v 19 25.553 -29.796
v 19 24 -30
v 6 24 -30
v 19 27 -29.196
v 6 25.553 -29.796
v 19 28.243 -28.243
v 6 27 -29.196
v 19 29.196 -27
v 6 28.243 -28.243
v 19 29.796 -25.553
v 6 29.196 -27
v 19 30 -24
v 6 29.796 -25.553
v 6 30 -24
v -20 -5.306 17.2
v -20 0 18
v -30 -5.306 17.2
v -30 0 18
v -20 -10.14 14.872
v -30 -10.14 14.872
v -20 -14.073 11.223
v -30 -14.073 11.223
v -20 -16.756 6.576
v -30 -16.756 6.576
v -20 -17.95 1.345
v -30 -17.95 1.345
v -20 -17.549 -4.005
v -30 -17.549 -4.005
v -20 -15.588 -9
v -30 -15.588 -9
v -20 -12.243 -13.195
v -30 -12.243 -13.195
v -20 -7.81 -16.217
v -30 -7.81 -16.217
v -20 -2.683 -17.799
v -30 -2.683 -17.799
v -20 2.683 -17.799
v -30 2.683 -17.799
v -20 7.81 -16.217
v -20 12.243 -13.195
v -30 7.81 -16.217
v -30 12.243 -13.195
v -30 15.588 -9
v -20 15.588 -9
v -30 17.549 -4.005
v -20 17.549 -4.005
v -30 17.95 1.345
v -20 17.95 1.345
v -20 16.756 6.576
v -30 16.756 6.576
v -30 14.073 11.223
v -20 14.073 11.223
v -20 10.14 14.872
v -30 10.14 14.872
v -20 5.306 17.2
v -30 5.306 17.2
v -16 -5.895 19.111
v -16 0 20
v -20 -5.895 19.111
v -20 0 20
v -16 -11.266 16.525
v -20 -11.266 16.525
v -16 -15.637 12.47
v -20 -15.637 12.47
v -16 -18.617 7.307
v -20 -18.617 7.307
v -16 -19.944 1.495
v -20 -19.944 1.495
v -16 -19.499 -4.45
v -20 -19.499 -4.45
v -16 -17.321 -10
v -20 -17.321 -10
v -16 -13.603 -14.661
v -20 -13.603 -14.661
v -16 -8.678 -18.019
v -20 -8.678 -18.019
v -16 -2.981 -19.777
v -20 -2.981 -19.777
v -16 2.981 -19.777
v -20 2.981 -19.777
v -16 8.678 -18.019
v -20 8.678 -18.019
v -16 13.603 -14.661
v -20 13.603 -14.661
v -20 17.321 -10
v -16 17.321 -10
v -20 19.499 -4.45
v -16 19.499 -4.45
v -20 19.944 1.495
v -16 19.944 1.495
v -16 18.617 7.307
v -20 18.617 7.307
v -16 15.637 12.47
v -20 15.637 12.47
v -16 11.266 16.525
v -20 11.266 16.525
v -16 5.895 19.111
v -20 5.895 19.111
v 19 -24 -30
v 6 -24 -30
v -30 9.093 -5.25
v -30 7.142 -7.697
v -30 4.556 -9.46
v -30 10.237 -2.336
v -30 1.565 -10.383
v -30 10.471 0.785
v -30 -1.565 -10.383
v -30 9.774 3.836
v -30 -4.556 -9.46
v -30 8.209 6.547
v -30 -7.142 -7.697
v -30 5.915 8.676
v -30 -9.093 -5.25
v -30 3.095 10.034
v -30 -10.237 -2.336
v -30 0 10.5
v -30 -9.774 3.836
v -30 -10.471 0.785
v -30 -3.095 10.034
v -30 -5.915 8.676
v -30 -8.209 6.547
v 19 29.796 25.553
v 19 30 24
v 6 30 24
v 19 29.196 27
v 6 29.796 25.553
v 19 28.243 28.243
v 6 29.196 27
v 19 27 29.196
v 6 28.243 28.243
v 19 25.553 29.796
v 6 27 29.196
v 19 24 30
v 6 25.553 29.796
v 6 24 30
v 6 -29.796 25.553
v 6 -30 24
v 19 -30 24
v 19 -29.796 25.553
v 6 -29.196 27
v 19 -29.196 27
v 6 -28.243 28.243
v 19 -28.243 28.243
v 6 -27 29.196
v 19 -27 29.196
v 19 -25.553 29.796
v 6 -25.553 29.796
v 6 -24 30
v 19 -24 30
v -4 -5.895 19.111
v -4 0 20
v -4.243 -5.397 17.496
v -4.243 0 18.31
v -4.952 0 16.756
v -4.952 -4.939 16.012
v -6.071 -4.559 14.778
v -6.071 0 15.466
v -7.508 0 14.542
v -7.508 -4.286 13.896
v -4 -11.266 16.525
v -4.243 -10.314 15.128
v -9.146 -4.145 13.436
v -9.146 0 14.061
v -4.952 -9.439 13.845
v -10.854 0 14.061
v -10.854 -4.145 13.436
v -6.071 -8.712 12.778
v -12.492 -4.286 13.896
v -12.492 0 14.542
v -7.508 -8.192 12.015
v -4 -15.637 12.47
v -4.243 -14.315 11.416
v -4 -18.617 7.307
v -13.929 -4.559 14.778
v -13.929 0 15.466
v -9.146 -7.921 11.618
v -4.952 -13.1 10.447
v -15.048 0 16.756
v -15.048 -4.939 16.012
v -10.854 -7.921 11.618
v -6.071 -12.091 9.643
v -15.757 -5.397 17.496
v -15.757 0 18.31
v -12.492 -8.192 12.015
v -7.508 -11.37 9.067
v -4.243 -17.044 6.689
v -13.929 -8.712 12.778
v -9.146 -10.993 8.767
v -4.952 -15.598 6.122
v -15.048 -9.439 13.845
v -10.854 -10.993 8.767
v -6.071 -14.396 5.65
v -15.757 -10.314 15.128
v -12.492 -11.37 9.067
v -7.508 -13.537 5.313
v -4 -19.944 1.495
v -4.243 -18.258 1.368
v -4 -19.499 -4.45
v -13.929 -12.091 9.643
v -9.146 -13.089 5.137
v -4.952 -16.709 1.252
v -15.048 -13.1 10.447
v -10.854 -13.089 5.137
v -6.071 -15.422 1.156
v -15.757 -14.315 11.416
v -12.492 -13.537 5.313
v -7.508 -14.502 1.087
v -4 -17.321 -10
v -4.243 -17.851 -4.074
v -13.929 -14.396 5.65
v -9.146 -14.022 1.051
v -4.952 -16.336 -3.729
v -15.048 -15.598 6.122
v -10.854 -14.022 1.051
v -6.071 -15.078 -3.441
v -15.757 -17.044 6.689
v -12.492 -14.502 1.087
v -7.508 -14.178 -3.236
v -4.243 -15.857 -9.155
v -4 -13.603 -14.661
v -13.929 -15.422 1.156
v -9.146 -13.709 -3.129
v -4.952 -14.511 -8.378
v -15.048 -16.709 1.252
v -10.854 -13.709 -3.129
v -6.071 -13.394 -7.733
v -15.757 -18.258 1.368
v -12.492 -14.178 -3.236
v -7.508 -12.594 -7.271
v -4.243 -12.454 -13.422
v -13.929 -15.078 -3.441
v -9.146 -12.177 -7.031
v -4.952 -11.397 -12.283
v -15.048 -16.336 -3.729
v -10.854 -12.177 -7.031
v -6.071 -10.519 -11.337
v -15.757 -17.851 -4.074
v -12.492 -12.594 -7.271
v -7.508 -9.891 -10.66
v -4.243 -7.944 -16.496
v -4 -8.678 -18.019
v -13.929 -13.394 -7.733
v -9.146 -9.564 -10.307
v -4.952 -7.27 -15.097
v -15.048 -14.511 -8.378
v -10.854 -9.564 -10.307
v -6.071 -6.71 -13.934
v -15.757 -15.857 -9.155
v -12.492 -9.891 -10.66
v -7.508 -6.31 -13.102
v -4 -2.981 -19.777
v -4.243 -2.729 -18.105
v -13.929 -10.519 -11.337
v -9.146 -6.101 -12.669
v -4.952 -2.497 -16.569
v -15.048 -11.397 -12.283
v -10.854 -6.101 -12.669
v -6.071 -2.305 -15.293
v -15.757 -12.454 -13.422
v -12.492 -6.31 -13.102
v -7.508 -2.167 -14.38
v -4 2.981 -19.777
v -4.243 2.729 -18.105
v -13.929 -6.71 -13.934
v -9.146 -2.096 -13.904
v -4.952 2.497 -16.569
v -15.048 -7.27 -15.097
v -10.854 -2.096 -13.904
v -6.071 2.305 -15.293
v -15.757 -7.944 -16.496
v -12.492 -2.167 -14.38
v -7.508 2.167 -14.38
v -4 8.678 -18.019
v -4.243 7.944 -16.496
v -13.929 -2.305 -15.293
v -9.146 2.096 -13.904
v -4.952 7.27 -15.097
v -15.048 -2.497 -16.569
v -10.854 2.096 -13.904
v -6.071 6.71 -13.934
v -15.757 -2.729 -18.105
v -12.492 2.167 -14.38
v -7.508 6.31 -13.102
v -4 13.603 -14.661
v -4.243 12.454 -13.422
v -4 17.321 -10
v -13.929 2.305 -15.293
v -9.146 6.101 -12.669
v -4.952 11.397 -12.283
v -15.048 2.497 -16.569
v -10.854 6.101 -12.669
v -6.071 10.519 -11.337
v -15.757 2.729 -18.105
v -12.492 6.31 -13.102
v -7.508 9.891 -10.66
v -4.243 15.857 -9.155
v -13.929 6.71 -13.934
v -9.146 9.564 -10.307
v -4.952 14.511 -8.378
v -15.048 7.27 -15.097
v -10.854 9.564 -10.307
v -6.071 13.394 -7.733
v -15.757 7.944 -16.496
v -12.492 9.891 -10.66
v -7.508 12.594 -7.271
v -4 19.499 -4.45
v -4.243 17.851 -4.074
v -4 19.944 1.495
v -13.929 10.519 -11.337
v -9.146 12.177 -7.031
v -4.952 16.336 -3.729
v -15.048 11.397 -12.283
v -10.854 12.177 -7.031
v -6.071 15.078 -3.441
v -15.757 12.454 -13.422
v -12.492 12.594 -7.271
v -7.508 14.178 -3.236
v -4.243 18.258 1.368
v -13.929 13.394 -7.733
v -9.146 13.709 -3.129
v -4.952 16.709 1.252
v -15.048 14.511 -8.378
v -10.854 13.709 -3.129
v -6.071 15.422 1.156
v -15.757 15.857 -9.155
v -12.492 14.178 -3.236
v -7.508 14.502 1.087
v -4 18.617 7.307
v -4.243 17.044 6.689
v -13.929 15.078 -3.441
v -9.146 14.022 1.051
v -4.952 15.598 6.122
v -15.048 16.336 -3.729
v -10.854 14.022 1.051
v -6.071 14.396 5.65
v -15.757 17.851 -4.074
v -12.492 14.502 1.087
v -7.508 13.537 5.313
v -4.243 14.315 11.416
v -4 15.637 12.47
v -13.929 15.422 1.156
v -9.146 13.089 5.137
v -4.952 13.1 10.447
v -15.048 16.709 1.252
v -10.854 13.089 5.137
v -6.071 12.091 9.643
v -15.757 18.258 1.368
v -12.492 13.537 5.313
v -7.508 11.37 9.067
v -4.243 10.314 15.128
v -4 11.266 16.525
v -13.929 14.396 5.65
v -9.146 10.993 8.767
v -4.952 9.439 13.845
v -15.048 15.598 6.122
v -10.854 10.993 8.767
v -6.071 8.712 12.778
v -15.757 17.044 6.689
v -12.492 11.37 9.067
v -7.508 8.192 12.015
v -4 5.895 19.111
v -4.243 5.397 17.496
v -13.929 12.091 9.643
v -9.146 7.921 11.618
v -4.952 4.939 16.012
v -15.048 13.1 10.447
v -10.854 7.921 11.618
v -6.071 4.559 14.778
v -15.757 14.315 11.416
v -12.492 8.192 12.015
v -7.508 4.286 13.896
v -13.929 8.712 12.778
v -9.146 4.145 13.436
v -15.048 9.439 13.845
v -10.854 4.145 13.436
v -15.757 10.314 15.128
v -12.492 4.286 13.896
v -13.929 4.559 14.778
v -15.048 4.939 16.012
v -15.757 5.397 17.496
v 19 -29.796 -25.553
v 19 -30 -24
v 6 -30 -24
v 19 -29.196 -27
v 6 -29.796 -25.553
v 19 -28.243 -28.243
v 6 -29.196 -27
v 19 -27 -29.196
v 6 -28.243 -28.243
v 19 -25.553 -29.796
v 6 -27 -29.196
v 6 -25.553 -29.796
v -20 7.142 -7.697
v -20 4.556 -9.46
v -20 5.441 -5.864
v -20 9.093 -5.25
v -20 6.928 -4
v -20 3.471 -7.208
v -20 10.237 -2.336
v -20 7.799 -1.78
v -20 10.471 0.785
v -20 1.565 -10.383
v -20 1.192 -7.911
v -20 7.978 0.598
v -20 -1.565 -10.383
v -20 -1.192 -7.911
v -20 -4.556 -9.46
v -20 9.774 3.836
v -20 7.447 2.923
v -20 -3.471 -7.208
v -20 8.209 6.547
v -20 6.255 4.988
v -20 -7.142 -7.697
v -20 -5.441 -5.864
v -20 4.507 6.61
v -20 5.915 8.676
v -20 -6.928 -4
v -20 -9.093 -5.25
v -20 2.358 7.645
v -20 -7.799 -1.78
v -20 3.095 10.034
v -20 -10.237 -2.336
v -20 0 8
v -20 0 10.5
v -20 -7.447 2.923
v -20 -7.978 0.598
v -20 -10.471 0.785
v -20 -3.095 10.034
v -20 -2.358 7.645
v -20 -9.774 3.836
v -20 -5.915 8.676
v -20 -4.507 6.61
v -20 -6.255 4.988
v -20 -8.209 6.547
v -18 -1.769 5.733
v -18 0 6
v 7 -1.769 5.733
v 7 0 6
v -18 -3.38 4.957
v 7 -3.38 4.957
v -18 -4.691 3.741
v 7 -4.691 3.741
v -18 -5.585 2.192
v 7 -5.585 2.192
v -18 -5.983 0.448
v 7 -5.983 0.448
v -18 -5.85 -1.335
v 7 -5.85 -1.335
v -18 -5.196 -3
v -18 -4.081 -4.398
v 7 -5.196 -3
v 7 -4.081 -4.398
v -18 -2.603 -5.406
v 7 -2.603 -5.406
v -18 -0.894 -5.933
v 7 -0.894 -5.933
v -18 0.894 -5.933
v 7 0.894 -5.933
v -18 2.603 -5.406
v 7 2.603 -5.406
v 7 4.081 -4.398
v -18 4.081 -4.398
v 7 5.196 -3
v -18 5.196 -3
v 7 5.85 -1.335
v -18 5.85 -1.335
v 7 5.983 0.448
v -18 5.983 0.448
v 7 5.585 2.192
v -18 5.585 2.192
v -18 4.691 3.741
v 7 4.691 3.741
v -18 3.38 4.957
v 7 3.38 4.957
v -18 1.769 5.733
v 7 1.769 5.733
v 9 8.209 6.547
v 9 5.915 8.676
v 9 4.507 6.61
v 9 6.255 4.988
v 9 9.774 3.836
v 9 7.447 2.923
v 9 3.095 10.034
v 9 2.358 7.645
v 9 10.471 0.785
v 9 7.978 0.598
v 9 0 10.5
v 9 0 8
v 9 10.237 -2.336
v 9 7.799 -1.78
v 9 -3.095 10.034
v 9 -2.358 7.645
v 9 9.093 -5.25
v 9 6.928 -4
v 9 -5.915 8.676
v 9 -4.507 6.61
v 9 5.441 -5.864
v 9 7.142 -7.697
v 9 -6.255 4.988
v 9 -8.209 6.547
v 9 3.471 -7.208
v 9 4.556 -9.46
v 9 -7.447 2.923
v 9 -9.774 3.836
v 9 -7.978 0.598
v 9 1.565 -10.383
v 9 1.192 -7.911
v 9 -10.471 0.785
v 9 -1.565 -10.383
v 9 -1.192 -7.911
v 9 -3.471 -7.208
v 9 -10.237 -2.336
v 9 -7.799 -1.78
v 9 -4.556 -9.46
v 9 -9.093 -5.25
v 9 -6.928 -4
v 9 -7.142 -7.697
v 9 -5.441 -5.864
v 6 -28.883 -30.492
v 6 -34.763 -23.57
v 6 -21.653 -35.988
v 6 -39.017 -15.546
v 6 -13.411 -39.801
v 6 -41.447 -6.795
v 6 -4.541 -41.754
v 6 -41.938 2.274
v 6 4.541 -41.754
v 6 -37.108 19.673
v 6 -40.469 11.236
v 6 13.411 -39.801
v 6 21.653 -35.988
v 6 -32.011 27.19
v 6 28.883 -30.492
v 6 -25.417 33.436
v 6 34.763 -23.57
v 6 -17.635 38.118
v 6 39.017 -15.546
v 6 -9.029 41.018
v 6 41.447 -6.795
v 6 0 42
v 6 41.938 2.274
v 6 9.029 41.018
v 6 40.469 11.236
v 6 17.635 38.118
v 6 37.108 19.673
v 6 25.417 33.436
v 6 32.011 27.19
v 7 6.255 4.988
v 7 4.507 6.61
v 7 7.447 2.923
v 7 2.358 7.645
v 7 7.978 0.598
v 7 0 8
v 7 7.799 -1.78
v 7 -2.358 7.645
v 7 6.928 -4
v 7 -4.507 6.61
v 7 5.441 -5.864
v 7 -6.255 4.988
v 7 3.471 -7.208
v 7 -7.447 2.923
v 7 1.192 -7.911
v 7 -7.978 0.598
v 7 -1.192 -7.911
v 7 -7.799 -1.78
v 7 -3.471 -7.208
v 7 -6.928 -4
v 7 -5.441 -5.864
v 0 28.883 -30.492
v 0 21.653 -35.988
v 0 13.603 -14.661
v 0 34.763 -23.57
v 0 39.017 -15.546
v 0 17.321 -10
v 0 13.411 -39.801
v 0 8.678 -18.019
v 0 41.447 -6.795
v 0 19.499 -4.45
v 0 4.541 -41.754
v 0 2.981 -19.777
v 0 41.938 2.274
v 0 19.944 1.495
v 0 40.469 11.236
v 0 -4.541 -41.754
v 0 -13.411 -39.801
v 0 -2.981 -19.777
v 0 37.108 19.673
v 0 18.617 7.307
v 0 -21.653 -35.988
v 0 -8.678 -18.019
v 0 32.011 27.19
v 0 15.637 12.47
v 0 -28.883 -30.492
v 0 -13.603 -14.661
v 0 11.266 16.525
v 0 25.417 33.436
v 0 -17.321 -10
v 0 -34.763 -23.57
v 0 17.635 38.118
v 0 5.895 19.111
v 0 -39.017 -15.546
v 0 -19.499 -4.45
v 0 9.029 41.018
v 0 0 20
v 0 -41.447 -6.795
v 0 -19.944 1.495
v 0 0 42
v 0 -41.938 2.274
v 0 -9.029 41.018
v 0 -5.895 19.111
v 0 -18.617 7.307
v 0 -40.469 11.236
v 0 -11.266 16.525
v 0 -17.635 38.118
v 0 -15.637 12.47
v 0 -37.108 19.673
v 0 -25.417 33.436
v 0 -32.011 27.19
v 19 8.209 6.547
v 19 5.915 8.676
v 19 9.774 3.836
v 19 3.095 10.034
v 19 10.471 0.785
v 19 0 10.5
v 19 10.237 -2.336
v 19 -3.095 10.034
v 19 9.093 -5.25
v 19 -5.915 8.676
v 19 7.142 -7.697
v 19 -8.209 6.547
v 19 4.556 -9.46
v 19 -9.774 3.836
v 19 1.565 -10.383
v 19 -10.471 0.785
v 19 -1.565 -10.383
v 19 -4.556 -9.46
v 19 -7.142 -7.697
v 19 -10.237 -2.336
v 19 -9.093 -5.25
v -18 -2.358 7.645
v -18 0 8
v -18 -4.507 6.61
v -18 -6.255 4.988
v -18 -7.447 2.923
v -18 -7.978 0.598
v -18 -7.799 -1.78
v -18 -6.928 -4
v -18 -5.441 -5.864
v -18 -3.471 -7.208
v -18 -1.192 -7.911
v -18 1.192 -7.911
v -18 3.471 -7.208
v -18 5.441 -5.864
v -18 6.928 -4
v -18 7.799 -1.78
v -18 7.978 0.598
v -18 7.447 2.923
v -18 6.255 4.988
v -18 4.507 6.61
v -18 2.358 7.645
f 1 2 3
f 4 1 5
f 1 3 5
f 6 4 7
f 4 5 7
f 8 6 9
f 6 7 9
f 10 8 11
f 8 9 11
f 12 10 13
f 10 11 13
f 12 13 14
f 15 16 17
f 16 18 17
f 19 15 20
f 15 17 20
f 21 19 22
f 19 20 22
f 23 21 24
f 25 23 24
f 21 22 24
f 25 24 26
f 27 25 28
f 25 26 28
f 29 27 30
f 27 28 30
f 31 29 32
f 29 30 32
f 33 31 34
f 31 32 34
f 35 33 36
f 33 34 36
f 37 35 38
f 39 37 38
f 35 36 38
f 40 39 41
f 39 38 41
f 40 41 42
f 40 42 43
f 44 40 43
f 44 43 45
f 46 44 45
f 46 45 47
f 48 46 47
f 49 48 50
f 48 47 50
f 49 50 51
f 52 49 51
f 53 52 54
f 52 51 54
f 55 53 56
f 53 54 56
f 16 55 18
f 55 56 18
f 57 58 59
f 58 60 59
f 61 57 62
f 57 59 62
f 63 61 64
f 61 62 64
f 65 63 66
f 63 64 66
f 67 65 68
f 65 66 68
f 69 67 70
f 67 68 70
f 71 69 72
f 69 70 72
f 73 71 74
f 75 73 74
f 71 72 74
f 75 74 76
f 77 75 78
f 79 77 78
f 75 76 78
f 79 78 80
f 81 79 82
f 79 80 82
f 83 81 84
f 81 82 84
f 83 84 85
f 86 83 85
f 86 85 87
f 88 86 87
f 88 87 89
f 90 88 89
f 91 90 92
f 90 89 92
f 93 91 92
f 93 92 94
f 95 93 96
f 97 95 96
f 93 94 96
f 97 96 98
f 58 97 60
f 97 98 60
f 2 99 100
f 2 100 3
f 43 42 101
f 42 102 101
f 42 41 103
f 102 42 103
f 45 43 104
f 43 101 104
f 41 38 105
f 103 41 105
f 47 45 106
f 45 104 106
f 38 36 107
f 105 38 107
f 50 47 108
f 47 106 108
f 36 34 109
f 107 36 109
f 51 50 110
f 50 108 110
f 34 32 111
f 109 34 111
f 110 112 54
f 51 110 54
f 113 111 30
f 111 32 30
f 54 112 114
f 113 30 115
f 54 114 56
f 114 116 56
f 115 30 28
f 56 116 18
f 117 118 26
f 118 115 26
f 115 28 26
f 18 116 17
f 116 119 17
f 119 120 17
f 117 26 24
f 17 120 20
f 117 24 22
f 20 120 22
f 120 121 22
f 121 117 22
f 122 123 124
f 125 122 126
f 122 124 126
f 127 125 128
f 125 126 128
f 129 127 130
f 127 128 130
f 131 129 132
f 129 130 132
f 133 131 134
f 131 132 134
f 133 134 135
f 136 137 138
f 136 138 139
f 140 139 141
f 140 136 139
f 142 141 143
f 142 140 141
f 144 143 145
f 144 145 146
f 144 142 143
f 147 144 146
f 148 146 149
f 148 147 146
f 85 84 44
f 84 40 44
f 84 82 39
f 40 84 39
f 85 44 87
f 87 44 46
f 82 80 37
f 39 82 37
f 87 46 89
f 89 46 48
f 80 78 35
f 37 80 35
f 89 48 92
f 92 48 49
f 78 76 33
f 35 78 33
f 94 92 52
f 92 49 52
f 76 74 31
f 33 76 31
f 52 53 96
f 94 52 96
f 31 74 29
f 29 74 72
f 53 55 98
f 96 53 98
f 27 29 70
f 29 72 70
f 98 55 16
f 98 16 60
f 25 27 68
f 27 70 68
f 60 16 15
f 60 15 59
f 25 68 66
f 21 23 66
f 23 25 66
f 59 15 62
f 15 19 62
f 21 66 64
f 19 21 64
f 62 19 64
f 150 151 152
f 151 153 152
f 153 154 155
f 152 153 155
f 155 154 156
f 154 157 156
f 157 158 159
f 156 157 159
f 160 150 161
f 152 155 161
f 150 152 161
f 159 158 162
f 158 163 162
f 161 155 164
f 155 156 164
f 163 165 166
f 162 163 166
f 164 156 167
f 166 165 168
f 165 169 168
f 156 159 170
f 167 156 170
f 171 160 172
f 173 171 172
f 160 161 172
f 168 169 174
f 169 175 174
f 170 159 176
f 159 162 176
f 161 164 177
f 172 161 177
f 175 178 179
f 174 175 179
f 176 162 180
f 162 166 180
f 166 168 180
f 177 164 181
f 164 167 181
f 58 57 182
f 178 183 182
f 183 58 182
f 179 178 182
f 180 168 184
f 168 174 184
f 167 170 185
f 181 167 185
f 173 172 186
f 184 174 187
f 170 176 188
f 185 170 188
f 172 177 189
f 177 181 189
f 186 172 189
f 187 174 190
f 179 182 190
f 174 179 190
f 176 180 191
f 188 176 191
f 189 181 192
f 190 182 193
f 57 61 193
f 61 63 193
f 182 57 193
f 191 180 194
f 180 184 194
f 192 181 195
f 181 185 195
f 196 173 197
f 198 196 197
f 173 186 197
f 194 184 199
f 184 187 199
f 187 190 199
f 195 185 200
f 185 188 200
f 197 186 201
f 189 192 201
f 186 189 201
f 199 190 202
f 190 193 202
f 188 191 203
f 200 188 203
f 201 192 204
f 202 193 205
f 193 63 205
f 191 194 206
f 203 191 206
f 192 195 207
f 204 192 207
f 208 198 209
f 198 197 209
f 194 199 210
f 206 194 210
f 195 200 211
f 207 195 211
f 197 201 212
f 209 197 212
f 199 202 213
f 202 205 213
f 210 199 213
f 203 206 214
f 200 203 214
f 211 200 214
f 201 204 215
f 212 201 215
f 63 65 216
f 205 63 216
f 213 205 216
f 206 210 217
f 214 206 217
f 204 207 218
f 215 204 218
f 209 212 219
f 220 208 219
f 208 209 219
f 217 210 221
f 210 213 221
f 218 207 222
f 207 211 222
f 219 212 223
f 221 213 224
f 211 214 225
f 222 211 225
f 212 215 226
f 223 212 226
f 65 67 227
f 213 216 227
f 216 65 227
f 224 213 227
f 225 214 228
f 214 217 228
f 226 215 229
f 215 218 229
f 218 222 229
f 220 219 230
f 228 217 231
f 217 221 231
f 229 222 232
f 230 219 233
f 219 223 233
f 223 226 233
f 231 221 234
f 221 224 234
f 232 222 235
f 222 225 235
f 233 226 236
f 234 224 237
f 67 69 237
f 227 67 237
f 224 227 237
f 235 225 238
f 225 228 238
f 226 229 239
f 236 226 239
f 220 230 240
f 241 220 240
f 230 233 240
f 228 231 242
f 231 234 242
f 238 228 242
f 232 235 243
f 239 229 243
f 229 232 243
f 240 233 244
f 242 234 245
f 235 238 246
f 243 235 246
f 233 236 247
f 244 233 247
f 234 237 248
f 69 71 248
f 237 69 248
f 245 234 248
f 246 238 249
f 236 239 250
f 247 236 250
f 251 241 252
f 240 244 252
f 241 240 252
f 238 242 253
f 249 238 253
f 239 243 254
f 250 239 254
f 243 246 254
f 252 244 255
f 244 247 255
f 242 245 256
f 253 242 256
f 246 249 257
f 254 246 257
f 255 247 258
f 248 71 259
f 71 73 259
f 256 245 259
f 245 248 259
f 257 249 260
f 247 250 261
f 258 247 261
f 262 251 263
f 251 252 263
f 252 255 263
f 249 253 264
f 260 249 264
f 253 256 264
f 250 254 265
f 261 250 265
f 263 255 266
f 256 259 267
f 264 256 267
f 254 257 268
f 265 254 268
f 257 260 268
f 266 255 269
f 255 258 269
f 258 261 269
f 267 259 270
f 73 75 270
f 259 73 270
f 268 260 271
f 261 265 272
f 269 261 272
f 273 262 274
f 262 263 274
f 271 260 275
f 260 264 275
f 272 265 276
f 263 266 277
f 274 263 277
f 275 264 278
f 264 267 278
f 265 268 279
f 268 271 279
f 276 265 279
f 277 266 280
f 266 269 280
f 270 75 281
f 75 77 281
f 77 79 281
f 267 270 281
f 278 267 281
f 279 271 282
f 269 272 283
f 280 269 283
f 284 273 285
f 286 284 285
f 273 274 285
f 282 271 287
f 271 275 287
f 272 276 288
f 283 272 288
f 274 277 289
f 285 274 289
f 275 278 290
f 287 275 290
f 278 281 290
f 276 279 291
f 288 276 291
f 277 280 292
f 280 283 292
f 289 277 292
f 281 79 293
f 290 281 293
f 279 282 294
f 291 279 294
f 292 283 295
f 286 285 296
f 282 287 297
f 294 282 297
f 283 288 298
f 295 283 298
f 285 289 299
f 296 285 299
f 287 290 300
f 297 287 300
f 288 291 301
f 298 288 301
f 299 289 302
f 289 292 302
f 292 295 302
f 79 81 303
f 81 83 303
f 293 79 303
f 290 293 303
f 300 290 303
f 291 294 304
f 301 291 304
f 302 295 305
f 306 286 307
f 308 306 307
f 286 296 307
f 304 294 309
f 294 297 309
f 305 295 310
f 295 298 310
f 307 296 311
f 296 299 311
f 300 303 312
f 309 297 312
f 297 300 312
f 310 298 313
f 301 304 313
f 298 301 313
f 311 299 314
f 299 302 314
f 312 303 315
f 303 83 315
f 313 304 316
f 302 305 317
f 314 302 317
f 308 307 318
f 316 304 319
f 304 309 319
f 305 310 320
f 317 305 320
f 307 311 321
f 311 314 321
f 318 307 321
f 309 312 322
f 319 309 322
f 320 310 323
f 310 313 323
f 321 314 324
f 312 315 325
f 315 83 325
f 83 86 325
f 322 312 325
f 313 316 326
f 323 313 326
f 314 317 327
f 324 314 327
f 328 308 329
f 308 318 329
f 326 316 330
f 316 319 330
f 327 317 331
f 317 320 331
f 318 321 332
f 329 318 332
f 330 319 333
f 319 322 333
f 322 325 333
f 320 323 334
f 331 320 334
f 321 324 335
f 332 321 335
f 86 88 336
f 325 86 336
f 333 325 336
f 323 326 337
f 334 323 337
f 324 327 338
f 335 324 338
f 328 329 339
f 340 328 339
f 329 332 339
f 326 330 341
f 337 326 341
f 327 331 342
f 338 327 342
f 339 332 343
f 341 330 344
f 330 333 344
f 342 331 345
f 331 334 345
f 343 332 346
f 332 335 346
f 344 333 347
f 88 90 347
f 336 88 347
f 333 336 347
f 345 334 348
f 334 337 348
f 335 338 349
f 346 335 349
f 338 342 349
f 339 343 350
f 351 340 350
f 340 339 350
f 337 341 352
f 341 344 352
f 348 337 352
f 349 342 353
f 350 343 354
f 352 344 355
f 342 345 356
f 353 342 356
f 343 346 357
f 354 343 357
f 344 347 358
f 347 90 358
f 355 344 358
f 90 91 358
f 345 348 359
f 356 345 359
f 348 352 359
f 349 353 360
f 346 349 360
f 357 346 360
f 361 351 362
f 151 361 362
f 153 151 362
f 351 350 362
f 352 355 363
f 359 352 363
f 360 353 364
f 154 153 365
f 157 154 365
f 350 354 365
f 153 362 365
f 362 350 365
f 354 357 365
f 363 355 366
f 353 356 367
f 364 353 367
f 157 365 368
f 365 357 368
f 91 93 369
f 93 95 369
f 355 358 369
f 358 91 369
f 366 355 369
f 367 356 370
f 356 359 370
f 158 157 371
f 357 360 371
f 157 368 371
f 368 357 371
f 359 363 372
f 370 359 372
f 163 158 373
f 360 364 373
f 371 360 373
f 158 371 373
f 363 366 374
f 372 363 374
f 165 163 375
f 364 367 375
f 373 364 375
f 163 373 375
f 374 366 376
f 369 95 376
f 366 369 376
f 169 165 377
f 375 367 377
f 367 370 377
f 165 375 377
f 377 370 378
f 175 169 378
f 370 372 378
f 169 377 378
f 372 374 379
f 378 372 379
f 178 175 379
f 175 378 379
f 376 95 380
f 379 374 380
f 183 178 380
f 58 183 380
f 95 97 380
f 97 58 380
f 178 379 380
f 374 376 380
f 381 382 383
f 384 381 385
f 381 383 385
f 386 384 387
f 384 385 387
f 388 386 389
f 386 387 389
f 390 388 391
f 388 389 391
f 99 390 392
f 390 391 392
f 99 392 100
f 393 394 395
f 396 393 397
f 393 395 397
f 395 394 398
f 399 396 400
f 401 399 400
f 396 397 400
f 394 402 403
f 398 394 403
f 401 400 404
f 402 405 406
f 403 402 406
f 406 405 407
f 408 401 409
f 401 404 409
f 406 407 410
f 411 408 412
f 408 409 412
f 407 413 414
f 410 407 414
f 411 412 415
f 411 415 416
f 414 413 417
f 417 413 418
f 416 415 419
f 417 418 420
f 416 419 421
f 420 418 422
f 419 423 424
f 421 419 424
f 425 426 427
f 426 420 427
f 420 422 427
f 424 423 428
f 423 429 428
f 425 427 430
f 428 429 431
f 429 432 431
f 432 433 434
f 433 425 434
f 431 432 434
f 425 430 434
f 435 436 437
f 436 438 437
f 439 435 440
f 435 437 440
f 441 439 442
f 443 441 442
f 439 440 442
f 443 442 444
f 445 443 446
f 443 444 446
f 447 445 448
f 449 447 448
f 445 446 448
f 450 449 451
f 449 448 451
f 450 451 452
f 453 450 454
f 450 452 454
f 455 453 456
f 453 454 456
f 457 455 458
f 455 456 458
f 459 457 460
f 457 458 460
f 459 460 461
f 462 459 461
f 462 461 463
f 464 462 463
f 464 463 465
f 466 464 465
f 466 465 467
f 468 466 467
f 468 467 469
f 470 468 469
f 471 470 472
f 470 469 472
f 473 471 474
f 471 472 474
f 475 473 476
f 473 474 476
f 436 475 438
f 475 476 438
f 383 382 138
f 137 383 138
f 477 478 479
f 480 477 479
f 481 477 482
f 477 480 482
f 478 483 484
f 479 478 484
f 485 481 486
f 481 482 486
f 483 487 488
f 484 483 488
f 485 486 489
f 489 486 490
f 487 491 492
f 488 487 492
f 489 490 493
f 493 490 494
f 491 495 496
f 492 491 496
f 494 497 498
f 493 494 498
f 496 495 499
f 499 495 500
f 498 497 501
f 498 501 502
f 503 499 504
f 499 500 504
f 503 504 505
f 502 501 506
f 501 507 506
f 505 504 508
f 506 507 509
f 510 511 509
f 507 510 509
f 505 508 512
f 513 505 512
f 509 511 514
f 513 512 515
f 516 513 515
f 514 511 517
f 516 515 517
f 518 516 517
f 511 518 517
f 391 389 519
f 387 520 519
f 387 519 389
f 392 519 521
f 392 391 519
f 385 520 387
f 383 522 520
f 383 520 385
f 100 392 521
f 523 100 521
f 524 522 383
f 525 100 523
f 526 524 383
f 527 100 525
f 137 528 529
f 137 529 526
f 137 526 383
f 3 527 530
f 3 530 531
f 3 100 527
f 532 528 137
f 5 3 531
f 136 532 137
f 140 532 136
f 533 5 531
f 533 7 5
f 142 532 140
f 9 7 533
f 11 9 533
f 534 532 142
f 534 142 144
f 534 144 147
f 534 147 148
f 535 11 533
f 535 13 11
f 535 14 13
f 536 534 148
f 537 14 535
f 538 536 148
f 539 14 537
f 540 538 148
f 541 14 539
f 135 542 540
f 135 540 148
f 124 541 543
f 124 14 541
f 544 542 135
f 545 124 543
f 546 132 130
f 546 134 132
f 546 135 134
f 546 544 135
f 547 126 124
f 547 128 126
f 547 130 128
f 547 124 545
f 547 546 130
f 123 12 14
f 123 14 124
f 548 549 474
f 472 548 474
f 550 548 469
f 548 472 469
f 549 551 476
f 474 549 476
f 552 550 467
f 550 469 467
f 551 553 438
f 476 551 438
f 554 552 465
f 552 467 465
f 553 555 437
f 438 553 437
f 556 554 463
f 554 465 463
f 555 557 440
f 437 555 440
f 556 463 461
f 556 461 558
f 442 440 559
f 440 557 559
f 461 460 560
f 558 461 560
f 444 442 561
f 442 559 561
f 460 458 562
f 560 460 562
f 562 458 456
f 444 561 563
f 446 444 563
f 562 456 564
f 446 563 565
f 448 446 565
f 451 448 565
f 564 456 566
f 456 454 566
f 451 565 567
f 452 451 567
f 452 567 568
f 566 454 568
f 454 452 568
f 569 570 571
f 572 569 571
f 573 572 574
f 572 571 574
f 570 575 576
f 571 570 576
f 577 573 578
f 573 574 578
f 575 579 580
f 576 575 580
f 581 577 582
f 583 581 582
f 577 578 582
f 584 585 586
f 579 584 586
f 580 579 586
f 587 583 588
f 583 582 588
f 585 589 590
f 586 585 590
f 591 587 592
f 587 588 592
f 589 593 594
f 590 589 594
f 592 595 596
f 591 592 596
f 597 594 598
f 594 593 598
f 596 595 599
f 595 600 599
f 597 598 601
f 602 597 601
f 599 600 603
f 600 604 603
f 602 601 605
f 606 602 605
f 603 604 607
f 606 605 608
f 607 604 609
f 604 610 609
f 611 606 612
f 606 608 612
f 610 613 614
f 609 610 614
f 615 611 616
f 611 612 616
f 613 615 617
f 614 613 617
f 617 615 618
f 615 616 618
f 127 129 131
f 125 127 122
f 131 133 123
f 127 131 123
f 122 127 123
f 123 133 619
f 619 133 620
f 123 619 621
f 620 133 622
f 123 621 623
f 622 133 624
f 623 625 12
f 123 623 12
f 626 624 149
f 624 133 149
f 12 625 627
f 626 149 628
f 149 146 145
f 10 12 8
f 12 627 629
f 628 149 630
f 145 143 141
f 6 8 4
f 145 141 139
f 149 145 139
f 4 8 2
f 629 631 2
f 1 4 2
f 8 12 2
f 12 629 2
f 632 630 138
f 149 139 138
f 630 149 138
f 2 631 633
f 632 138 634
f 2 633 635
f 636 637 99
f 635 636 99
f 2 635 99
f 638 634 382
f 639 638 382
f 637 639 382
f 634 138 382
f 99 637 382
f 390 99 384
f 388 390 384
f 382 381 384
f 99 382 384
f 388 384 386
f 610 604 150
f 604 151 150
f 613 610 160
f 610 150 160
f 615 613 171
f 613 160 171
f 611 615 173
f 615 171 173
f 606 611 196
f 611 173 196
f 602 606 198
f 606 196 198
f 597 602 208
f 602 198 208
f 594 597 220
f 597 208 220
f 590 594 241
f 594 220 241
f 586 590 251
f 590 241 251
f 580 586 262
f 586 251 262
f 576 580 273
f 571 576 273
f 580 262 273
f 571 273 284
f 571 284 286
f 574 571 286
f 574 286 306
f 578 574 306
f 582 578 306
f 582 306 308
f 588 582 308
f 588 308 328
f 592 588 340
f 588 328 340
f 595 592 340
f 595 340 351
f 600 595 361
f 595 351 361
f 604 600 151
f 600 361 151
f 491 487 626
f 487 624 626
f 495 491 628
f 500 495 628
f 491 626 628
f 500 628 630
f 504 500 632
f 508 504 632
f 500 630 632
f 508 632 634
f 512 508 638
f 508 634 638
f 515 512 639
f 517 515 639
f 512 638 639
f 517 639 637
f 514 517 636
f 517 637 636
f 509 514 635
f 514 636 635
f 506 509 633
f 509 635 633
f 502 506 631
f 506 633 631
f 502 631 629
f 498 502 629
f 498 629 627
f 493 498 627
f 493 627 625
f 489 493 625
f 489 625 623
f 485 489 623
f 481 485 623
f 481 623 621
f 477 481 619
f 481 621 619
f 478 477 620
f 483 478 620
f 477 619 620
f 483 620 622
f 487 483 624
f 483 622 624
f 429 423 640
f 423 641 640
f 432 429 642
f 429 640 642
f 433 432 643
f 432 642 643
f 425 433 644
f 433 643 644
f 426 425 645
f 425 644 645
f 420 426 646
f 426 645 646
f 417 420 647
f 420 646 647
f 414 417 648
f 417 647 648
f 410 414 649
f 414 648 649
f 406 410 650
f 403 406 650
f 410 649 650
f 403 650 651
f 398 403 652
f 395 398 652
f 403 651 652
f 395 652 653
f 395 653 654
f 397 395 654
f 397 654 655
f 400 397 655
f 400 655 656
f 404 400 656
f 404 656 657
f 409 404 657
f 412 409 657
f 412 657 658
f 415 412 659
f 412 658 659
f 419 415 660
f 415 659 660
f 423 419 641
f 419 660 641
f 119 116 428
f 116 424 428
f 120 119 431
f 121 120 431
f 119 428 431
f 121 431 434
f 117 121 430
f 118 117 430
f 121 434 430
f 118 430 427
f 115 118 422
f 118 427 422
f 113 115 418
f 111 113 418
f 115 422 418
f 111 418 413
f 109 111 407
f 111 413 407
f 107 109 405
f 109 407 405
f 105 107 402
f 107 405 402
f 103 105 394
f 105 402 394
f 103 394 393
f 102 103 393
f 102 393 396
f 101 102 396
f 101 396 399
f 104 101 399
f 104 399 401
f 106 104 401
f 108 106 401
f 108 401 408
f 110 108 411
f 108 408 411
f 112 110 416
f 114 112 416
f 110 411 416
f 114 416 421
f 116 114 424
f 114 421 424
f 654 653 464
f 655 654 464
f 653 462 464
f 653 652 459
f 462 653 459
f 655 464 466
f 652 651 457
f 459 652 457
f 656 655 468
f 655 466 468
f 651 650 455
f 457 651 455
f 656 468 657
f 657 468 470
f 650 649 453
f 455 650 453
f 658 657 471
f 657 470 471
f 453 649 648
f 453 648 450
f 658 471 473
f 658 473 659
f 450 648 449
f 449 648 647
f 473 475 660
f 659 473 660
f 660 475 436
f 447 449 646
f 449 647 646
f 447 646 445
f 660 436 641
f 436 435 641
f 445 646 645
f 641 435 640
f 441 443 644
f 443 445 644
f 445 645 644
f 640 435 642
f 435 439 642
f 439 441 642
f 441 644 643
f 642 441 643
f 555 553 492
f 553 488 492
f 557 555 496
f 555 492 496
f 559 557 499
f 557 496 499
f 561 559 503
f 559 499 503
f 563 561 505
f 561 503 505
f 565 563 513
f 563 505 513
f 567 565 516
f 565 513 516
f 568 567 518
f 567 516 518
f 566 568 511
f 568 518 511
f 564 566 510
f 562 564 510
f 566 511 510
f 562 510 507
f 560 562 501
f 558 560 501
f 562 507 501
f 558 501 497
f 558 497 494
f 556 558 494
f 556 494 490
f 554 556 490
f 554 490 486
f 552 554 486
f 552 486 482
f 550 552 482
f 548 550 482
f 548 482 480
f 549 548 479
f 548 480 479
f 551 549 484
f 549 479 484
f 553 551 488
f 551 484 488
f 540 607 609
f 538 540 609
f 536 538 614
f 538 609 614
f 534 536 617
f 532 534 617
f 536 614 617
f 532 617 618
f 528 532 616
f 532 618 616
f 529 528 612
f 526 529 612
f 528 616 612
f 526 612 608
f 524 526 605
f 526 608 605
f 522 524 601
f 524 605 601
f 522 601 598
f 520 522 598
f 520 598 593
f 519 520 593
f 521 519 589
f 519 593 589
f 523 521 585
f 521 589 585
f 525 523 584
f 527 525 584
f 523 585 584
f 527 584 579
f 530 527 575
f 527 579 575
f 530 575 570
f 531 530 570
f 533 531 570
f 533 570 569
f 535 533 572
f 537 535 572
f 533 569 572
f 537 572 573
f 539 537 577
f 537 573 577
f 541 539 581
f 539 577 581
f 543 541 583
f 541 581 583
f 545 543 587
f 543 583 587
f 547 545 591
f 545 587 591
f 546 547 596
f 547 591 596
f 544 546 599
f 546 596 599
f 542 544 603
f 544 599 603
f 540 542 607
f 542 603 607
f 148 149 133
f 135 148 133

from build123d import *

# Parameters (mm, degrees)
F3_R        = 44
F3_W        = 60
F3_H        = 60
F4_DEPTH    = 13
F5_T1_DEPTH = 28


# Not quite as in the source:
# - a fillet or chamfer that OpenCascade refuses, or shapes differently, is made with other operations: its cross-section is extruded or revolved along the edge and cut away or added


with BuildPart() as f2:
    # F1 (on Front) → F2 (revolve)
    with BuildSketch(Plane.XZ):
        with BuildLine():
            Line((-18, 6), (0, 6))
            Line((0, 6), (7, 6))
            Line((7, 6), (7, 8))
            Line((7, 8), (9, 8))
            Line((9, 8), (9, 10.5))
            Line((9, 10.5), (19, 10.5))
            Line((19, 10.5), (19, 44))
            Line((19, 44), (6, 44))
            Line((6, 44), (6, 42))
            Line((6, 42), (0, 42))
            Line((0, 42), (0, 20))
            Line((0, 20), (-4, 20))
            ThreePointArc((-4, 20), (-10, 14), (-16, 20))
            Line((-16, 20), (-20, 20))
            Line((-20, 20), (-20, 18))
            Line((-20, 18), (-30, 18))
            Line((-30, 18), (-30, 10.5))
            Line((-30, 10.5), (-20, 10.5))
            Line((-20, 10.5), (-20, 8))
            Line((-20, 8), (-18, 8))
            Line((-18, 8), (-18, 6))
        make_face()
    revolve(axis=Axis((43.6499677598, 0, 0), (1, 0, 0)))

    # F3 (on face) → F4 (cut, through all)
    with BuildSketch(Plane.YZ.offset(19)):
        Circle(F3_R)
        Rectangle(F3_W, F3_H, mode=Mode.SUBTRACT)
    extrude(amount=-F4_DEPTH, mode=Mode.SUBTRACT)

    # F5: fillet of radius 6 on 4 edges, made by hand

    # F5_s2 → F5_t1 (cut)
    with BuildSketch(Plane.YZ.offset(6)):
        with BuildLine():
            ThreePointArc((-30, -24), (-28.2426406871, -28.2426406871), (-24, -30))
            Line((-24, -30), (-30, -30))
            Line((-30, -30), (-30, -24))
        make_face()
        with BuildLine():
            ThreePointArc((24, -30), (28.2426406871, -28.2426406871), (30, -24))
            Line((30, -24), (30, -30))
            Line((30, -30), (24, -30))
        make_face()
        with BuildLine():
            ThreePointArc((-30, 24), (-28.2426406871, 28.2426406871), (-24, 30))
            Line((-24, 30), (-30, 30))
            Line((-30, 30), (-30, 24))
        make_face()
        with BuildLine():
            ThreePointArc((30, 24), (28.2426406871, 28.2426406871), (24, 30))
            Line((24, 30), (30, 30))
            Line((30, 30), (30, 24))
        make_face()
    extrude(amount=F5_T1_DEPTH, mode=Mode.SUBTRACT)


solid = f2.part
